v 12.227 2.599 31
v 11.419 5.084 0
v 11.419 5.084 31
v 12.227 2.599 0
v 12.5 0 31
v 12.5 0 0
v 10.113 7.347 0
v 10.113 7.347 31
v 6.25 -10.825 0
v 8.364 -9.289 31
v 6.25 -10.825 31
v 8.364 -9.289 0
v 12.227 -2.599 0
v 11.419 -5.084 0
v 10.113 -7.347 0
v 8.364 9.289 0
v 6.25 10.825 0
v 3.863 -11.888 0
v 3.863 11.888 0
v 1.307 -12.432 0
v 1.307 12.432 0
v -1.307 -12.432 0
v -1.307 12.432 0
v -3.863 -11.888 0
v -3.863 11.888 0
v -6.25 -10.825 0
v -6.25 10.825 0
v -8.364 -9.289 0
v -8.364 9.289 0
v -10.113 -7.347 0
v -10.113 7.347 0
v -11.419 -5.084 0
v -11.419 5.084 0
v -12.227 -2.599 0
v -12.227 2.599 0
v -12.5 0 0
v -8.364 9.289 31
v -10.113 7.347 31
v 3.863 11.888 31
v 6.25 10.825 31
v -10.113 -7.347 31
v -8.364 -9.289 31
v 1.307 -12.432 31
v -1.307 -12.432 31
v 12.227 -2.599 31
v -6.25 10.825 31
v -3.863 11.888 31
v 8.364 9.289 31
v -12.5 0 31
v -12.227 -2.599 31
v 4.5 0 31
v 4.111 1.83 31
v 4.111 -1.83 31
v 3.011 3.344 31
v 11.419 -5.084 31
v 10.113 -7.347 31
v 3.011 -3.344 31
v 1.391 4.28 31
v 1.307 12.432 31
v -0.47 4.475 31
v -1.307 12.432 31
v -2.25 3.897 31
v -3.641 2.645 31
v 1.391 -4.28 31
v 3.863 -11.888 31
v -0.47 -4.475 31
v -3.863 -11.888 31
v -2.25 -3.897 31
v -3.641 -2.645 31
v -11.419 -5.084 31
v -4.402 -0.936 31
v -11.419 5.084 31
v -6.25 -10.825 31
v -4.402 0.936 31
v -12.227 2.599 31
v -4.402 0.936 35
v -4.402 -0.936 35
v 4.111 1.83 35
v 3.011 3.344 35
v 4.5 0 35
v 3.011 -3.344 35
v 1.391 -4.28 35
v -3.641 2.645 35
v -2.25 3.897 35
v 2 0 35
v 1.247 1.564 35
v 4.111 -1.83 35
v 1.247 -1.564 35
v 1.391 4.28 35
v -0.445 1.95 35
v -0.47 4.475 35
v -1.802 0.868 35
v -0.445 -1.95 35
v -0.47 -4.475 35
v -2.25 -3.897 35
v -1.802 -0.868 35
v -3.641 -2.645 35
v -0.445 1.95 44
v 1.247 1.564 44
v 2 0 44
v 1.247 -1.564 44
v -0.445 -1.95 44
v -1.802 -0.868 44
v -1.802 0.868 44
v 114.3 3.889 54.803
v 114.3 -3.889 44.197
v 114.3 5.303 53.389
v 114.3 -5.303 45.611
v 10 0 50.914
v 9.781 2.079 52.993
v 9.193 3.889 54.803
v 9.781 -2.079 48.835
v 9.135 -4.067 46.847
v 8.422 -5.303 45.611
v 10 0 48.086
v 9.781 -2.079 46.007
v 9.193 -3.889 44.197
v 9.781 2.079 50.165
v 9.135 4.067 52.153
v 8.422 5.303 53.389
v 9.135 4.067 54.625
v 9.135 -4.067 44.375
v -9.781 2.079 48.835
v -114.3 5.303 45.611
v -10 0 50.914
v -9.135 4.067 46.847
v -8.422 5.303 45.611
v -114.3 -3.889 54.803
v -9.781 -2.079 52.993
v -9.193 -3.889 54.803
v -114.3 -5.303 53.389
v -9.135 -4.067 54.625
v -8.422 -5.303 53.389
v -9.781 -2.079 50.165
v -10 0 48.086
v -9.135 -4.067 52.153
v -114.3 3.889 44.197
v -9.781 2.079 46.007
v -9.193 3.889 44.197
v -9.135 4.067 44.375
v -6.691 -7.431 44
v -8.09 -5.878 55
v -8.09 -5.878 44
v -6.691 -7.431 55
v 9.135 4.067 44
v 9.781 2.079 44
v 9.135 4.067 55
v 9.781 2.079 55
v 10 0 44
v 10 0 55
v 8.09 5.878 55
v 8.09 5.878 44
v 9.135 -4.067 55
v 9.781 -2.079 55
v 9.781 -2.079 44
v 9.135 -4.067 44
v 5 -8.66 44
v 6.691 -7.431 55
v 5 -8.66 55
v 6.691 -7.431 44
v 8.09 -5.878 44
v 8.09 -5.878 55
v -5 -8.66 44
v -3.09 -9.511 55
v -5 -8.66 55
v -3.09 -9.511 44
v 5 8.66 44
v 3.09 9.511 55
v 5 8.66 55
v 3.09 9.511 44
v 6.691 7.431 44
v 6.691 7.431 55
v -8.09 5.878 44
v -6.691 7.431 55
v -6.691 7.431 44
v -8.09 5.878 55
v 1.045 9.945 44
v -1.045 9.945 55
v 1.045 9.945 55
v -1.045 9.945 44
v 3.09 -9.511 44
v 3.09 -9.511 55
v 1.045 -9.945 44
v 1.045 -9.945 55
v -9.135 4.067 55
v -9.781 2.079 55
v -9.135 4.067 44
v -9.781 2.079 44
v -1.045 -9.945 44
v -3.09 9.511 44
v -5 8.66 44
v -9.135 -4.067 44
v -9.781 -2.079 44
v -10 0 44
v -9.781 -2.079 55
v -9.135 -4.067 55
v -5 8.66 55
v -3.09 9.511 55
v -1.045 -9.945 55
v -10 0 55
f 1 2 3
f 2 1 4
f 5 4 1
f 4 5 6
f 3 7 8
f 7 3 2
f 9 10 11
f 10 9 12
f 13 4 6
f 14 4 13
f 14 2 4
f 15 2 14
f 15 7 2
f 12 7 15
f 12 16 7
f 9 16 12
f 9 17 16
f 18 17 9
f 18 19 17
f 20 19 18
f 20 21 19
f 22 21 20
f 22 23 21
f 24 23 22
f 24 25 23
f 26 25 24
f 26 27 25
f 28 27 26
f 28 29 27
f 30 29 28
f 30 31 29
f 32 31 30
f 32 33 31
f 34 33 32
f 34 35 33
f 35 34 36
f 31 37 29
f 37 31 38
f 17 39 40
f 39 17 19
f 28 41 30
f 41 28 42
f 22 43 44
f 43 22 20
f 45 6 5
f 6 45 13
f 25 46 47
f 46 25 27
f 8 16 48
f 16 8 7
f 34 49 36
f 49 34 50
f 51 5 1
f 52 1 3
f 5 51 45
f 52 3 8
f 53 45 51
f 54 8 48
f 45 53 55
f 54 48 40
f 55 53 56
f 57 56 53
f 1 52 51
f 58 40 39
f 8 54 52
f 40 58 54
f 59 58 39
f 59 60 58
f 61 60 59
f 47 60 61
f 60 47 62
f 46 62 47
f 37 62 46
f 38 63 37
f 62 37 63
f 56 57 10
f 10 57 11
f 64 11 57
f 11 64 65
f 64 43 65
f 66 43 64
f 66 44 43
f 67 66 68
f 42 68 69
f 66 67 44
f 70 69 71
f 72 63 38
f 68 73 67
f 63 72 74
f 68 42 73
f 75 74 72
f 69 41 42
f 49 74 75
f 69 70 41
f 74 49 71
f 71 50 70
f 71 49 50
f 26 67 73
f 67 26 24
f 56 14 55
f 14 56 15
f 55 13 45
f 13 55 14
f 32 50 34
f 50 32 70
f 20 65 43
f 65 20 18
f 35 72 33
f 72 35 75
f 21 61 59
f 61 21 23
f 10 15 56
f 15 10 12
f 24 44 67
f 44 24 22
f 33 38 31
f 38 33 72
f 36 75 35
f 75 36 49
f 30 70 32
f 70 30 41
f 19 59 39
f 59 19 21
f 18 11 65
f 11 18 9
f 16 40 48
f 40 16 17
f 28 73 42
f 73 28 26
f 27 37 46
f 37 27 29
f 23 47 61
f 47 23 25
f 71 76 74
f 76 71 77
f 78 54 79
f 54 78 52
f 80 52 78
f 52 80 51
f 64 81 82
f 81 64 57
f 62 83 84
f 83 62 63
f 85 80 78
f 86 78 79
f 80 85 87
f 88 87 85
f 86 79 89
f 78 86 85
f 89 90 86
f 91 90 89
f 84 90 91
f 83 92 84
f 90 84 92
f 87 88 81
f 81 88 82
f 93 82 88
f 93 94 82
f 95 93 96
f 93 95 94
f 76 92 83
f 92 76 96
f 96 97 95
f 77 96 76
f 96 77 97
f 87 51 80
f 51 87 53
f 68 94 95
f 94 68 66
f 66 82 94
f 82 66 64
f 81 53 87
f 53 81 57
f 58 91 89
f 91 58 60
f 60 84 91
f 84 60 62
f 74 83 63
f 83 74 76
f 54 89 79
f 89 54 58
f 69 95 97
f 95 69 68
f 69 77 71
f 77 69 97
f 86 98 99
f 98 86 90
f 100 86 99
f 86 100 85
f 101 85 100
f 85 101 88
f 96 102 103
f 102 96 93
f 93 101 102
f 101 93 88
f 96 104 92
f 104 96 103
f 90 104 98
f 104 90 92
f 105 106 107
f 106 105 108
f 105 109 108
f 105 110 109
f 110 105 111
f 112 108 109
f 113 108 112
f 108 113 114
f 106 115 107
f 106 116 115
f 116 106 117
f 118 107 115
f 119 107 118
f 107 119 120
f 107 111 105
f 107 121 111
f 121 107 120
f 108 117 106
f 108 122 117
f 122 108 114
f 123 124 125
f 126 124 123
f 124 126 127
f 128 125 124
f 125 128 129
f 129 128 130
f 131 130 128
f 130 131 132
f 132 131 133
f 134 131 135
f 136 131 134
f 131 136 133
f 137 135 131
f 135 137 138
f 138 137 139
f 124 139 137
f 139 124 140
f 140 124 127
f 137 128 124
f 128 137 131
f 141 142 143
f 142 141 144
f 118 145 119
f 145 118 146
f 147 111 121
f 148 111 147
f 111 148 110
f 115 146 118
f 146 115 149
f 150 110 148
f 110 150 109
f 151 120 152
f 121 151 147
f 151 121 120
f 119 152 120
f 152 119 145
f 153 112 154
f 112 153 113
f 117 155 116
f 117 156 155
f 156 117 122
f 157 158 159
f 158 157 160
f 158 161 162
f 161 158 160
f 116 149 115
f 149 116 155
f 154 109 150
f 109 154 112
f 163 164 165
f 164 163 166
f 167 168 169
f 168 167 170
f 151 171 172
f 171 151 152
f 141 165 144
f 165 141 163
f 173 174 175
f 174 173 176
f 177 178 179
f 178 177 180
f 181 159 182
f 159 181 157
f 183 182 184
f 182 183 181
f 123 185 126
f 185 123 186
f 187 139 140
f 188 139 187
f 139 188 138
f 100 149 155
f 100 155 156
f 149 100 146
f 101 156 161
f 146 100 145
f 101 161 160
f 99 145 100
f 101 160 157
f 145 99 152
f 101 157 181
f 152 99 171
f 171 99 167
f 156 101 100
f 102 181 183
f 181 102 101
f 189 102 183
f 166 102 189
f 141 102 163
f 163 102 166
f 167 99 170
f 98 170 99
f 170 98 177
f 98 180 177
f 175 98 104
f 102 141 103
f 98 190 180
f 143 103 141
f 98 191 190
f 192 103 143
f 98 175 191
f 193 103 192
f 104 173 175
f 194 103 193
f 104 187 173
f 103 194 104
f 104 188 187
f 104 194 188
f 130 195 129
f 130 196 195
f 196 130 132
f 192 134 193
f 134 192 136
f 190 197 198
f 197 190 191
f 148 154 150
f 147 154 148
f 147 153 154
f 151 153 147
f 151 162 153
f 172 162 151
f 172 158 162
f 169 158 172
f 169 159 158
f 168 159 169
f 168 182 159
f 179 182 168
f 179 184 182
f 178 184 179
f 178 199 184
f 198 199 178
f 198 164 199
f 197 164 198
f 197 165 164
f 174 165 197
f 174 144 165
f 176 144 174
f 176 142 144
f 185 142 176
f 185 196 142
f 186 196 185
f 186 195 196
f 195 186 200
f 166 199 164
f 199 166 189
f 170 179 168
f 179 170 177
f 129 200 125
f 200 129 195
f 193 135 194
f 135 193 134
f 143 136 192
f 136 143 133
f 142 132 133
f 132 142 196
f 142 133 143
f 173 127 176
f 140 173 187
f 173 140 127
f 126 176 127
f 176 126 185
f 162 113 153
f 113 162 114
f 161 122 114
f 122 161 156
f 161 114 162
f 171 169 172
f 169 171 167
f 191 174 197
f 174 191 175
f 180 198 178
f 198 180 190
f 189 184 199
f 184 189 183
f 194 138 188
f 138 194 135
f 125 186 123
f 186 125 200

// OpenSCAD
// motor = DYS2836
motor_dia = 25;
motor_length = 31;
motor_shaft_ring_dia = 9;
motor_shaft_ring_length = 4;
motor_shaft_dia = 4;
motor_shaft_length = 12.5;
motor_base_to_prop_base = 44;

module motor() {
  cylinder(d=motor_dia, h=motor_length);
  translate([0, 0, motor_length]) cylinder(d=motor_shaft_ring_dia, h=motor_shaft_ring_length);
  translate([0, 0, motor_length + motor_shaft_ring_length]) cylinder(d=motor_shaft_dia, h=motor_shaft_length);
}
/*motor();*/

module motor_hole_pattern(spacing, d, h) {
  for (xf = [-1, 1]) translate([xf * spacing[0] / 2, 0, 0]) cylinder(d=d, h=h);
  for (yf = [-1, 1]) translate([0, yf * spacing[1] / 2, 0]) cylinder(d=d, h=h);
}
/*motor_hole_pattern([16, 19], 3, 1);*/

module motor_hole_pattern_16_19(d, h) {
    motor_hole_pattern([16, 19], d, h);
}

/*motor_hole_pattern_16_19(3, 1);*/

prop_size = 9;
prop_dia = prop_size * 25.4;
prop_hub_thickness = 11;
prop_hub_dia = 20;

module propeller() {
  cylinder(d=prop_hub_dia, h=prop_hub_thickness, center=true);
  for (a = [0, 180]) rotate(a) translate([prop_dia / 4, 0, 0]) rotate([45, 0, 0]) cube([prop_dia / 2, 13, 2], center=true);
}
/*propeller();*/

module motor_with_propeller() {
  motor();
  translate([0, 0, prop_hub_thickness / 2 + motor_base_to_prop_base]) propeller();
}
motor_with_propeller();
